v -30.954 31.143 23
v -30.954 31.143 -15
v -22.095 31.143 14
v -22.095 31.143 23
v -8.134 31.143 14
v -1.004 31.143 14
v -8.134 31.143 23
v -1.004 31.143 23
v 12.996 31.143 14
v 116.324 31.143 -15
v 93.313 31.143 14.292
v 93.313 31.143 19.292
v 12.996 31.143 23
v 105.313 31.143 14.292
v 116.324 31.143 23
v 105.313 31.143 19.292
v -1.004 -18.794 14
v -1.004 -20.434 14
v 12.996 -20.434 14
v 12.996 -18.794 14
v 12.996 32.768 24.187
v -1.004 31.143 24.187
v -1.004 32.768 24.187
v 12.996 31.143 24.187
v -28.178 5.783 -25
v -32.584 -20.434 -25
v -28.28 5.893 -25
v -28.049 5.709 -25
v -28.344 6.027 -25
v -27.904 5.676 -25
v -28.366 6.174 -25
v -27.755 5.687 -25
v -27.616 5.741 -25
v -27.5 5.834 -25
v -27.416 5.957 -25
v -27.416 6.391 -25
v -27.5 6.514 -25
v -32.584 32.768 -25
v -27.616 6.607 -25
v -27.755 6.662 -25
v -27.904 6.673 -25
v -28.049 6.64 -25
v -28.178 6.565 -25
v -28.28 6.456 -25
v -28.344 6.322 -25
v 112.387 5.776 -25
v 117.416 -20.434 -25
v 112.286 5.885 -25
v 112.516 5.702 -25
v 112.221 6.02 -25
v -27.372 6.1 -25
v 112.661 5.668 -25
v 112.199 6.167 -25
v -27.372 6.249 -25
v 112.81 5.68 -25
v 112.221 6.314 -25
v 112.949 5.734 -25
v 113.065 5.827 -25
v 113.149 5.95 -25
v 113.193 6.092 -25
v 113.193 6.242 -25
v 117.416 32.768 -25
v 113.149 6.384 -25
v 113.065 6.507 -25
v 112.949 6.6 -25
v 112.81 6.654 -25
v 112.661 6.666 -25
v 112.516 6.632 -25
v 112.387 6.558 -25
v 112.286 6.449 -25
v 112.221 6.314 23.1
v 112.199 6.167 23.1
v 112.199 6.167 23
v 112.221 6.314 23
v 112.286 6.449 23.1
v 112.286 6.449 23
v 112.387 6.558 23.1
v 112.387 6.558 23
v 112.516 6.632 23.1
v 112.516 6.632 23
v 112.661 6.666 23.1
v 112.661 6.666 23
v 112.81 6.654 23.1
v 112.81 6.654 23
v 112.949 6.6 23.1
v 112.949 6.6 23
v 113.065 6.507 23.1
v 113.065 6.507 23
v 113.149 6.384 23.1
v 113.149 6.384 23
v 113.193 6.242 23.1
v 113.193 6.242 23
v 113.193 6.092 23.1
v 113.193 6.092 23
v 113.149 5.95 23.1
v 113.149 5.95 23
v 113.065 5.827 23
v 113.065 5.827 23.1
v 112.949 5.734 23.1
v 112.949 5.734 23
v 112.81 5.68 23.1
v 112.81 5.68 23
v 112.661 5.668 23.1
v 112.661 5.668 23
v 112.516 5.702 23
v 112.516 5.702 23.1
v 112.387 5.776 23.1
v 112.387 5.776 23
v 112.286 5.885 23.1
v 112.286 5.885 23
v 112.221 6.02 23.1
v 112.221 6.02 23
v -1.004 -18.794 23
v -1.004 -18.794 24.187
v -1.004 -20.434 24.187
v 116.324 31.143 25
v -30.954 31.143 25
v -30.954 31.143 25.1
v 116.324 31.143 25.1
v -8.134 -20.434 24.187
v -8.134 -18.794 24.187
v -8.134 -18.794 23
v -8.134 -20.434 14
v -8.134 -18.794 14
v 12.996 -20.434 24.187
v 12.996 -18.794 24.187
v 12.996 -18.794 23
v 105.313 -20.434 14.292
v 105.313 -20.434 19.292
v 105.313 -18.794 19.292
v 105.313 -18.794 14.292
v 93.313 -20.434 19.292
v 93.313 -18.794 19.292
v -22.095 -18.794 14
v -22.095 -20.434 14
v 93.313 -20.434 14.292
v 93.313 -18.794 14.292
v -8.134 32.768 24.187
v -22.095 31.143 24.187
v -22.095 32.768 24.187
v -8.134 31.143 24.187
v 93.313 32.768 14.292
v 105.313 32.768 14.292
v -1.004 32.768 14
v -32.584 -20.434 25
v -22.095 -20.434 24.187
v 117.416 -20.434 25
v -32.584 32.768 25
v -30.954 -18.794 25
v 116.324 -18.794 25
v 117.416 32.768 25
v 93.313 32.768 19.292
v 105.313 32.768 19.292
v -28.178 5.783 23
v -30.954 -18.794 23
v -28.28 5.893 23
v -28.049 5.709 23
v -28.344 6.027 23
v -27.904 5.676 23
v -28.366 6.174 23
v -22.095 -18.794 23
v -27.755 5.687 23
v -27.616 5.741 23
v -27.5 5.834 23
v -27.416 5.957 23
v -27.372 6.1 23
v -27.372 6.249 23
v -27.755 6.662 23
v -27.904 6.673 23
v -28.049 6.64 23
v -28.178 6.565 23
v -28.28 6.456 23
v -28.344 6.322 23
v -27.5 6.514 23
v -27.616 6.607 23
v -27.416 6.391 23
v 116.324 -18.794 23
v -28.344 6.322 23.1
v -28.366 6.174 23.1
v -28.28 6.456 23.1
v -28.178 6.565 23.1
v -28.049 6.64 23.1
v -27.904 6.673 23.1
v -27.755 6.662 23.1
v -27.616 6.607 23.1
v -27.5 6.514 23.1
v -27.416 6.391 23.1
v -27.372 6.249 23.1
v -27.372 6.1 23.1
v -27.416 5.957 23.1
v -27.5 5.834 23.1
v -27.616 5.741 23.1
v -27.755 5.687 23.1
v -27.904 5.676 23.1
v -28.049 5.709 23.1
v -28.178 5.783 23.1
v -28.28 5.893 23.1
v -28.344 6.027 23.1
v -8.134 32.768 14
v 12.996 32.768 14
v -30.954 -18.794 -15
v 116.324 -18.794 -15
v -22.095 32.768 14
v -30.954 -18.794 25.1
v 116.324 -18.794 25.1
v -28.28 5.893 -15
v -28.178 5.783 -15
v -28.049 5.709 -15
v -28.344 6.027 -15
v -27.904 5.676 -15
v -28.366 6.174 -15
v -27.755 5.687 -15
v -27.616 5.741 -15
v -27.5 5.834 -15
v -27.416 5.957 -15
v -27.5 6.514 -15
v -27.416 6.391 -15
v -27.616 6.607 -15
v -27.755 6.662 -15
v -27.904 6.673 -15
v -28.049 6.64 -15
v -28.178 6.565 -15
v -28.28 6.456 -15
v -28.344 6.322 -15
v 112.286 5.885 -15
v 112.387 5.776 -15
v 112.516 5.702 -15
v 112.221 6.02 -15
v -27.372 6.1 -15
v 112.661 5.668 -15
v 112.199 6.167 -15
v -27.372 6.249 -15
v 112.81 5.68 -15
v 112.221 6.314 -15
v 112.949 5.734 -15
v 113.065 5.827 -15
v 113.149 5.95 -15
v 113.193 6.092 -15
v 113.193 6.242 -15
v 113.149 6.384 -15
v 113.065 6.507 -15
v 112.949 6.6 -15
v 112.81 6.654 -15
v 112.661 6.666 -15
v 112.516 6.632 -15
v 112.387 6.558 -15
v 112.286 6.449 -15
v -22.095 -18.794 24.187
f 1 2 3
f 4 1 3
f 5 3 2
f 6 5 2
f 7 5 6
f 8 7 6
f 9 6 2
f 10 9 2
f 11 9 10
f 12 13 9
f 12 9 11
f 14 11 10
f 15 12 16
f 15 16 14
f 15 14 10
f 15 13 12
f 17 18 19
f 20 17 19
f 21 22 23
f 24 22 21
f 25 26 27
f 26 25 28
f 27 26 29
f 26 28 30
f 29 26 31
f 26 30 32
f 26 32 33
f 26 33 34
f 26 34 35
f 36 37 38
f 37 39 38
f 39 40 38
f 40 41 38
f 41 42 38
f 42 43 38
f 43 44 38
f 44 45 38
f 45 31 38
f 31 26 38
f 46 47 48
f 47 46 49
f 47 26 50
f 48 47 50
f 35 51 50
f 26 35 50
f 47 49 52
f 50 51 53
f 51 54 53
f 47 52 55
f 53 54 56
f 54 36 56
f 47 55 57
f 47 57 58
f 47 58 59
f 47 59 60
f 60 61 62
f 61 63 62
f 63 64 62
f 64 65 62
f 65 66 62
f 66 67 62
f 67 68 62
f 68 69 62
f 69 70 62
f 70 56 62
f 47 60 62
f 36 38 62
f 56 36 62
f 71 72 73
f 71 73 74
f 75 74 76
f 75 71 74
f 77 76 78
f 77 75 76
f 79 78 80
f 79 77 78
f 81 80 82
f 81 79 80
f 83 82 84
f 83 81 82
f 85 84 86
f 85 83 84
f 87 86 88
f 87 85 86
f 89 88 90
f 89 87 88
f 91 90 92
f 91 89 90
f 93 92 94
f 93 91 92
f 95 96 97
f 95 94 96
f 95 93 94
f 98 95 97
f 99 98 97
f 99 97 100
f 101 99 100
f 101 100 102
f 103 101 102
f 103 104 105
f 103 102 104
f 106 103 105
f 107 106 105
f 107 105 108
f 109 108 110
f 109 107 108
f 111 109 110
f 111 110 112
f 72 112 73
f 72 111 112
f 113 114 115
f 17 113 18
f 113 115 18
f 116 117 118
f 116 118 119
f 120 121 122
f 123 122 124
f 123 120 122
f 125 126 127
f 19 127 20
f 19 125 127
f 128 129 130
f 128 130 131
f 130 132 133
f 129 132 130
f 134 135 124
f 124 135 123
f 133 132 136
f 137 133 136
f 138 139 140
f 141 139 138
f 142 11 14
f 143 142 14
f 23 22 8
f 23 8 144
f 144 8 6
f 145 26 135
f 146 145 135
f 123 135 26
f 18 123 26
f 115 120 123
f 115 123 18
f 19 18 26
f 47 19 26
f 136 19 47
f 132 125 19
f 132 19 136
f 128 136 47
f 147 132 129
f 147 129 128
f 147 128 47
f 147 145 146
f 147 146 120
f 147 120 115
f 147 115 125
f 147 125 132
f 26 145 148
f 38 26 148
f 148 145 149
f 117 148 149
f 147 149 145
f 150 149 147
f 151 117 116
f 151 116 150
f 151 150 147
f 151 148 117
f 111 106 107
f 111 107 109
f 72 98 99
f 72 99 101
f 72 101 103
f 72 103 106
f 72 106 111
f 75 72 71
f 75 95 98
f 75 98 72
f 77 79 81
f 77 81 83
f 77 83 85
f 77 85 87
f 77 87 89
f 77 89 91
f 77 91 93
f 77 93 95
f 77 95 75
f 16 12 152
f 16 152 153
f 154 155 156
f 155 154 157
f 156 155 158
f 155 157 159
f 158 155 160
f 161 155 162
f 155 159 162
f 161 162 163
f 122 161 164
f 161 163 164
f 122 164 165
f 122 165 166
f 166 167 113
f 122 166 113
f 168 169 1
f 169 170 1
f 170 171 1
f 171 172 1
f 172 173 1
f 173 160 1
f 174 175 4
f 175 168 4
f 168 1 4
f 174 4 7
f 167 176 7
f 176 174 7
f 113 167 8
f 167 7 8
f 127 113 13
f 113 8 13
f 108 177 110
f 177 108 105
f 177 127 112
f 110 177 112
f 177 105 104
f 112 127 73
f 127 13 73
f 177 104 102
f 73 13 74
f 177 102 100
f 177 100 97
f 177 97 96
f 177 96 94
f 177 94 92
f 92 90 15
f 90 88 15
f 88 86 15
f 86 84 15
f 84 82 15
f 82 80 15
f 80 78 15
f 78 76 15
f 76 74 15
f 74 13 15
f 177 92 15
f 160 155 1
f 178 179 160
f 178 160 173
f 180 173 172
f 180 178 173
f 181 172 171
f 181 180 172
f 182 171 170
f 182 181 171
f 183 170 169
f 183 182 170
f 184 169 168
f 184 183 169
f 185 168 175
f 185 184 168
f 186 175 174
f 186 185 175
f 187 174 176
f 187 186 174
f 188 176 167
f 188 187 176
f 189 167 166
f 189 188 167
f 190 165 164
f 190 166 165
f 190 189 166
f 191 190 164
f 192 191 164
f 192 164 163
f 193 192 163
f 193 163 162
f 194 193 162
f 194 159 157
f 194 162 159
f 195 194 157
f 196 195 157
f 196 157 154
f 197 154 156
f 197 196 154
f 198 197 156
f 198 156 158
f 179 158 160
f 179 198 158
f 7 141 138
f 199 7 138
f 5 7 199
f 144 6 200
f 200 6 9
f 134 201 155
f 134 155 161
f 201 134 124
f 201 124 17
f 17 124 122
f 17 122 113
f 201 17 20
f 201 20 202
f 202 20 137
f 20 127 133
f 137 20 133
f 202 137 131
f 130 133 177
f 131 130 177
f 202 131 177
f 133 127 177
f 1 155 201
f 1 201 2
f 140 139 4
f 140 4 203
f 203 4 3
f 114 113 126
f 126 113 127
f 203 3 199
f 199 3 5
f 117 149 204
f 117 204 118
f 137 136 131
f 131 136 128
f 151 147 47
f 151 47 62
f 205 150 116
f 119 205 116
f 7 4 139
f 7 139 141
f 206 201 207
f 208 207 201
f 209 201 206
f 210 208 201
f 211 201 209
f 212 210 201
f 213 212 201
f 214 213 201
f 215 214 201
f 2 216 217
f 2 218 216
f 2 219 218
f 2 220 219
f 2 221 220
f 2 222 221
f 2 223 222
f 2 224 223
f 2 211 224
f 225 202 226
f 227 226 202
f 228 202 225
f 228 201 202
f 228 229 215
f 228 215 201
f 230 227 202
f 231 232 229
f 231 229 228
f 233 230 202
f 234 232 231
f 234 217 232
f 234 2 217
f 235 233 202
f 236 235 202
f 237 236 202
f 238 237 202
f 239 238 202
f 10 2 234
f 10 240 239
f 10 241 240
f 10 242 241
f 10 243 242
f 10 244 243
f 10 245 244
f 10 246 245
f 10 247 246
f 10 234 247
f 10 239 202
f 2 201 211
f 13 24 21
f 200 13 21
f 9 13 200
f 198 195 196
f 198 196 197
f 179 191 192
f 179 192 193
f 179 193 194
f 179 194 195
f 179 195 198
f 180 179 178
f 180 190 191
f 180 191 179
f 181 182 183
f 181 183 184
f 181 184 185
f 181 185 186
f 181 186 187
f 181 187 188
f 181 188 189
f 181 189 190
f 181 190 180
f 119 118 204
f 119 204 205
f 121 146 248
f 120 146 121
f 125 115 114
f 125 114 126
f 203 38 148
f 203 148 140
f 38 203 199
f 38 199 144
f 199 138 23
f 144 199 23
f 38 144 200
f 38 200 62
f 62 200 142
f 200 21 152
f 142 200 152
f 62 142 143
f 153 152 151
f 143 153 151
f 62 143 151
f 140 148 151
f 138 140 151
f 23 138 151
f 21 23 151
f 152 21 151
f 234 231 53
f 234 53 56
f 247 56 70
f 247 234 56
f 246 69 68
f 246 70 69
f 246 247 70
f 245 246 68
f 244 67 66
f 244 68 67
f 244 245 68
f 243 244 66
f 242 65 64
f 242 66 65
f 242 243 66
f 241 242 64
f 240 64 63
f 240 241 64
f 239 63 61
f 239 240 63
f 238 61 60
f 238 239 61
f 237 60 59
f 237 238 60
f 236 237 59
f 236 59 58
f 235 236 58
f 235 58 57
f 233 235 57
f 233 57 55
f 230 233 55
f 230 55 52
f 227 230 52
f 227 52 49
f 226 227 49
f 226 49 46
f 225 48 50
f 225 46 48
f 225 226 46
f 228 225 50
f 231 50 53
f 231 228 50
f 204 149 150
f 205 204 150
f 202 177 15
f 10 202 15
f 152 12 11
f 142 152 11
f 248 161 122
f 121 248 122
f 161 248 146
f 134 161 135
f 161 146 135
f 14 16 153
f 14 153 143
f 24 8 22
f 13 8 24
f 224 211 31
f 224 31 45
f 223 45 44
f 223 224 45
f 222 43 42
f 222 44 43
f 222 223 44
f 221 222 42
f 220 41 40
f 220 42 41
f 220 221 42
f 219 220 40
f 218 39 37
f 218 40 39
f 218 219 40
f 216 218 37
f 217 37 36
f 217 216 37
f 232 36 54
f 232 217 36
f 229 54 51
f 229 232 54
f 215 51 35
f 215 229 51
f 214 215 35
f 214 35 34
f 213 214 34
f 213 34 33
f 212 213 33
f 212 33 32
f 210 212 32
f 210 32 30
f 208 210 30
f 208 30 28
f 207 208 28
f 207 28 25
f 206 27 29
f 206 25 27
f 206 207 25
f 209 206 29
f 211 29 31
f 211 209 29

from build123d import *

# Parameters (mm, degrees)
SKETCH_1_W                = 150
SKETCH_1_H                = 53.201915286
EXTRUDE_1_DEPTH           = 25
CUT_EXTRUDE_4_DEPTH       = 132.308761728
CUT_EXTRUDE_4_DEPTH_BACK  = 132.308761728
SKETCH_2_W                = 13.960564471
SKETCH_2_H                = 10.187423892
SKETCH_2_W_2              = 14
SKETCH_2_W_3              = 12
SKETCH_2_H_2              = 5
SKETCH_4_W                = 147.277496434
SKETCH_4_H                = 49.937069792
CUT_EXTRUDE_9_DEPTH       = 40
EXTRUDE_2_DEPTH           = 0.1
EXTRUDE_2_DEPTH_BACK      = 2
SKETCH_6_W                = 147.277496434
SKETCH_6_H                = 49.937069792
CUT_EXTRUDE_11_DEPTH      = 132.012543018
CUT_EXTRUDE_11_DEPTH_BACK = 0.1
SKETCH_7_R                = 0.5


with BuildPart() as part:
    # 草图1 → 凸台-拉伸1 (new, symmetric)
    with BuildSketch(Plane.XY):
        with Locations((42.416128008, 6.167004021)):
            Rectangle(SKETCH_1_W, SKETCH_1_H)
    extrude(amount=EXTRUDE_1_DEPTH, both=True)

    # 草图2 → 切除-拉伸4 (cut, two sides: drawn at the far end of the back side and taken through both)
    with BuildSketch(Plane(origin=(0, 32.767961664, 0), x_dir=(1, 0, 0), z_dir=(0, 1, 0)).offset(-CUT_EXTRUDE_4_DEPTH_BACK)):
        with Locations((-15.114618297, -19.093711946)):
            Rectangle(SKETCH_2_W, SKETCH_2_H)
        with Locations((5.995879761, -19.093711946)):
            Rectangle(SKETCH_2_W_2, SKETCH_2_H)
        with Locations((99.312670009, -16.792388629)):
            Rectangle(SKETCH_2_W_3, SKETCH_2_H_2)
    extrude(amount=CUT_EXTRUDE_4_DEPTH + CUT_EXTRUDE_4_DEPTH_BACK, mode=Mode.SUBTRACT)

    # 草图4 → 切除-拉伸9 (cut)
    with BuildSketch(Plane.XY.offset(25)):
        with Locations((42.684765752, 6.174377474)):
            Rectangle(SKETCH_4_W, SKETCH_4_H)
    extrude(amount=-CUT_EXTRUDE_9_DEPTH, mode=Mode.SUBTRACT)

    # 草图6 → 凸台-拉伸2 (add, two sides: drawn at the far end of the back side and taken through both)
    with BuildSketch(Plane.XY.offset(25).offset(-EXTRUDE_2_DEPTH_BACK)):
        with Locations((42.684765752, 6.174377474)):
            Rectangle(SKETCH_6_W, SKETCH_6_H)
    extrude(amount=EXTRUDE_2_DEPTH + EXTRUDE_2_DEPTH_BACK)

    # 草图7 → 切除-拉伸11 (cut, two sides: drawn at the far end of the back side and taken through both)
    with BuildSketch(Plane(origin=(0, 0, 23), x_dir=(-1, 0, 0), z_dir=(0, 0, -1)).offset(-CUT_EXTRUDE_11_DEPTH_BACK)):
        with Locations((-112.698705999, 6.167004021)):
            Circle(SKETCH_7_R)
        with Locations((27.866449983, 6.174377474)):
            Circle(SKETCH_7_R)
    extrude(amount=CUT_EXTRUDE_11_DEPTH + CUT_EXTRUDE_11_DEPTH_BACK, mode=Mode.SUBTRACT)


solid = part.part
